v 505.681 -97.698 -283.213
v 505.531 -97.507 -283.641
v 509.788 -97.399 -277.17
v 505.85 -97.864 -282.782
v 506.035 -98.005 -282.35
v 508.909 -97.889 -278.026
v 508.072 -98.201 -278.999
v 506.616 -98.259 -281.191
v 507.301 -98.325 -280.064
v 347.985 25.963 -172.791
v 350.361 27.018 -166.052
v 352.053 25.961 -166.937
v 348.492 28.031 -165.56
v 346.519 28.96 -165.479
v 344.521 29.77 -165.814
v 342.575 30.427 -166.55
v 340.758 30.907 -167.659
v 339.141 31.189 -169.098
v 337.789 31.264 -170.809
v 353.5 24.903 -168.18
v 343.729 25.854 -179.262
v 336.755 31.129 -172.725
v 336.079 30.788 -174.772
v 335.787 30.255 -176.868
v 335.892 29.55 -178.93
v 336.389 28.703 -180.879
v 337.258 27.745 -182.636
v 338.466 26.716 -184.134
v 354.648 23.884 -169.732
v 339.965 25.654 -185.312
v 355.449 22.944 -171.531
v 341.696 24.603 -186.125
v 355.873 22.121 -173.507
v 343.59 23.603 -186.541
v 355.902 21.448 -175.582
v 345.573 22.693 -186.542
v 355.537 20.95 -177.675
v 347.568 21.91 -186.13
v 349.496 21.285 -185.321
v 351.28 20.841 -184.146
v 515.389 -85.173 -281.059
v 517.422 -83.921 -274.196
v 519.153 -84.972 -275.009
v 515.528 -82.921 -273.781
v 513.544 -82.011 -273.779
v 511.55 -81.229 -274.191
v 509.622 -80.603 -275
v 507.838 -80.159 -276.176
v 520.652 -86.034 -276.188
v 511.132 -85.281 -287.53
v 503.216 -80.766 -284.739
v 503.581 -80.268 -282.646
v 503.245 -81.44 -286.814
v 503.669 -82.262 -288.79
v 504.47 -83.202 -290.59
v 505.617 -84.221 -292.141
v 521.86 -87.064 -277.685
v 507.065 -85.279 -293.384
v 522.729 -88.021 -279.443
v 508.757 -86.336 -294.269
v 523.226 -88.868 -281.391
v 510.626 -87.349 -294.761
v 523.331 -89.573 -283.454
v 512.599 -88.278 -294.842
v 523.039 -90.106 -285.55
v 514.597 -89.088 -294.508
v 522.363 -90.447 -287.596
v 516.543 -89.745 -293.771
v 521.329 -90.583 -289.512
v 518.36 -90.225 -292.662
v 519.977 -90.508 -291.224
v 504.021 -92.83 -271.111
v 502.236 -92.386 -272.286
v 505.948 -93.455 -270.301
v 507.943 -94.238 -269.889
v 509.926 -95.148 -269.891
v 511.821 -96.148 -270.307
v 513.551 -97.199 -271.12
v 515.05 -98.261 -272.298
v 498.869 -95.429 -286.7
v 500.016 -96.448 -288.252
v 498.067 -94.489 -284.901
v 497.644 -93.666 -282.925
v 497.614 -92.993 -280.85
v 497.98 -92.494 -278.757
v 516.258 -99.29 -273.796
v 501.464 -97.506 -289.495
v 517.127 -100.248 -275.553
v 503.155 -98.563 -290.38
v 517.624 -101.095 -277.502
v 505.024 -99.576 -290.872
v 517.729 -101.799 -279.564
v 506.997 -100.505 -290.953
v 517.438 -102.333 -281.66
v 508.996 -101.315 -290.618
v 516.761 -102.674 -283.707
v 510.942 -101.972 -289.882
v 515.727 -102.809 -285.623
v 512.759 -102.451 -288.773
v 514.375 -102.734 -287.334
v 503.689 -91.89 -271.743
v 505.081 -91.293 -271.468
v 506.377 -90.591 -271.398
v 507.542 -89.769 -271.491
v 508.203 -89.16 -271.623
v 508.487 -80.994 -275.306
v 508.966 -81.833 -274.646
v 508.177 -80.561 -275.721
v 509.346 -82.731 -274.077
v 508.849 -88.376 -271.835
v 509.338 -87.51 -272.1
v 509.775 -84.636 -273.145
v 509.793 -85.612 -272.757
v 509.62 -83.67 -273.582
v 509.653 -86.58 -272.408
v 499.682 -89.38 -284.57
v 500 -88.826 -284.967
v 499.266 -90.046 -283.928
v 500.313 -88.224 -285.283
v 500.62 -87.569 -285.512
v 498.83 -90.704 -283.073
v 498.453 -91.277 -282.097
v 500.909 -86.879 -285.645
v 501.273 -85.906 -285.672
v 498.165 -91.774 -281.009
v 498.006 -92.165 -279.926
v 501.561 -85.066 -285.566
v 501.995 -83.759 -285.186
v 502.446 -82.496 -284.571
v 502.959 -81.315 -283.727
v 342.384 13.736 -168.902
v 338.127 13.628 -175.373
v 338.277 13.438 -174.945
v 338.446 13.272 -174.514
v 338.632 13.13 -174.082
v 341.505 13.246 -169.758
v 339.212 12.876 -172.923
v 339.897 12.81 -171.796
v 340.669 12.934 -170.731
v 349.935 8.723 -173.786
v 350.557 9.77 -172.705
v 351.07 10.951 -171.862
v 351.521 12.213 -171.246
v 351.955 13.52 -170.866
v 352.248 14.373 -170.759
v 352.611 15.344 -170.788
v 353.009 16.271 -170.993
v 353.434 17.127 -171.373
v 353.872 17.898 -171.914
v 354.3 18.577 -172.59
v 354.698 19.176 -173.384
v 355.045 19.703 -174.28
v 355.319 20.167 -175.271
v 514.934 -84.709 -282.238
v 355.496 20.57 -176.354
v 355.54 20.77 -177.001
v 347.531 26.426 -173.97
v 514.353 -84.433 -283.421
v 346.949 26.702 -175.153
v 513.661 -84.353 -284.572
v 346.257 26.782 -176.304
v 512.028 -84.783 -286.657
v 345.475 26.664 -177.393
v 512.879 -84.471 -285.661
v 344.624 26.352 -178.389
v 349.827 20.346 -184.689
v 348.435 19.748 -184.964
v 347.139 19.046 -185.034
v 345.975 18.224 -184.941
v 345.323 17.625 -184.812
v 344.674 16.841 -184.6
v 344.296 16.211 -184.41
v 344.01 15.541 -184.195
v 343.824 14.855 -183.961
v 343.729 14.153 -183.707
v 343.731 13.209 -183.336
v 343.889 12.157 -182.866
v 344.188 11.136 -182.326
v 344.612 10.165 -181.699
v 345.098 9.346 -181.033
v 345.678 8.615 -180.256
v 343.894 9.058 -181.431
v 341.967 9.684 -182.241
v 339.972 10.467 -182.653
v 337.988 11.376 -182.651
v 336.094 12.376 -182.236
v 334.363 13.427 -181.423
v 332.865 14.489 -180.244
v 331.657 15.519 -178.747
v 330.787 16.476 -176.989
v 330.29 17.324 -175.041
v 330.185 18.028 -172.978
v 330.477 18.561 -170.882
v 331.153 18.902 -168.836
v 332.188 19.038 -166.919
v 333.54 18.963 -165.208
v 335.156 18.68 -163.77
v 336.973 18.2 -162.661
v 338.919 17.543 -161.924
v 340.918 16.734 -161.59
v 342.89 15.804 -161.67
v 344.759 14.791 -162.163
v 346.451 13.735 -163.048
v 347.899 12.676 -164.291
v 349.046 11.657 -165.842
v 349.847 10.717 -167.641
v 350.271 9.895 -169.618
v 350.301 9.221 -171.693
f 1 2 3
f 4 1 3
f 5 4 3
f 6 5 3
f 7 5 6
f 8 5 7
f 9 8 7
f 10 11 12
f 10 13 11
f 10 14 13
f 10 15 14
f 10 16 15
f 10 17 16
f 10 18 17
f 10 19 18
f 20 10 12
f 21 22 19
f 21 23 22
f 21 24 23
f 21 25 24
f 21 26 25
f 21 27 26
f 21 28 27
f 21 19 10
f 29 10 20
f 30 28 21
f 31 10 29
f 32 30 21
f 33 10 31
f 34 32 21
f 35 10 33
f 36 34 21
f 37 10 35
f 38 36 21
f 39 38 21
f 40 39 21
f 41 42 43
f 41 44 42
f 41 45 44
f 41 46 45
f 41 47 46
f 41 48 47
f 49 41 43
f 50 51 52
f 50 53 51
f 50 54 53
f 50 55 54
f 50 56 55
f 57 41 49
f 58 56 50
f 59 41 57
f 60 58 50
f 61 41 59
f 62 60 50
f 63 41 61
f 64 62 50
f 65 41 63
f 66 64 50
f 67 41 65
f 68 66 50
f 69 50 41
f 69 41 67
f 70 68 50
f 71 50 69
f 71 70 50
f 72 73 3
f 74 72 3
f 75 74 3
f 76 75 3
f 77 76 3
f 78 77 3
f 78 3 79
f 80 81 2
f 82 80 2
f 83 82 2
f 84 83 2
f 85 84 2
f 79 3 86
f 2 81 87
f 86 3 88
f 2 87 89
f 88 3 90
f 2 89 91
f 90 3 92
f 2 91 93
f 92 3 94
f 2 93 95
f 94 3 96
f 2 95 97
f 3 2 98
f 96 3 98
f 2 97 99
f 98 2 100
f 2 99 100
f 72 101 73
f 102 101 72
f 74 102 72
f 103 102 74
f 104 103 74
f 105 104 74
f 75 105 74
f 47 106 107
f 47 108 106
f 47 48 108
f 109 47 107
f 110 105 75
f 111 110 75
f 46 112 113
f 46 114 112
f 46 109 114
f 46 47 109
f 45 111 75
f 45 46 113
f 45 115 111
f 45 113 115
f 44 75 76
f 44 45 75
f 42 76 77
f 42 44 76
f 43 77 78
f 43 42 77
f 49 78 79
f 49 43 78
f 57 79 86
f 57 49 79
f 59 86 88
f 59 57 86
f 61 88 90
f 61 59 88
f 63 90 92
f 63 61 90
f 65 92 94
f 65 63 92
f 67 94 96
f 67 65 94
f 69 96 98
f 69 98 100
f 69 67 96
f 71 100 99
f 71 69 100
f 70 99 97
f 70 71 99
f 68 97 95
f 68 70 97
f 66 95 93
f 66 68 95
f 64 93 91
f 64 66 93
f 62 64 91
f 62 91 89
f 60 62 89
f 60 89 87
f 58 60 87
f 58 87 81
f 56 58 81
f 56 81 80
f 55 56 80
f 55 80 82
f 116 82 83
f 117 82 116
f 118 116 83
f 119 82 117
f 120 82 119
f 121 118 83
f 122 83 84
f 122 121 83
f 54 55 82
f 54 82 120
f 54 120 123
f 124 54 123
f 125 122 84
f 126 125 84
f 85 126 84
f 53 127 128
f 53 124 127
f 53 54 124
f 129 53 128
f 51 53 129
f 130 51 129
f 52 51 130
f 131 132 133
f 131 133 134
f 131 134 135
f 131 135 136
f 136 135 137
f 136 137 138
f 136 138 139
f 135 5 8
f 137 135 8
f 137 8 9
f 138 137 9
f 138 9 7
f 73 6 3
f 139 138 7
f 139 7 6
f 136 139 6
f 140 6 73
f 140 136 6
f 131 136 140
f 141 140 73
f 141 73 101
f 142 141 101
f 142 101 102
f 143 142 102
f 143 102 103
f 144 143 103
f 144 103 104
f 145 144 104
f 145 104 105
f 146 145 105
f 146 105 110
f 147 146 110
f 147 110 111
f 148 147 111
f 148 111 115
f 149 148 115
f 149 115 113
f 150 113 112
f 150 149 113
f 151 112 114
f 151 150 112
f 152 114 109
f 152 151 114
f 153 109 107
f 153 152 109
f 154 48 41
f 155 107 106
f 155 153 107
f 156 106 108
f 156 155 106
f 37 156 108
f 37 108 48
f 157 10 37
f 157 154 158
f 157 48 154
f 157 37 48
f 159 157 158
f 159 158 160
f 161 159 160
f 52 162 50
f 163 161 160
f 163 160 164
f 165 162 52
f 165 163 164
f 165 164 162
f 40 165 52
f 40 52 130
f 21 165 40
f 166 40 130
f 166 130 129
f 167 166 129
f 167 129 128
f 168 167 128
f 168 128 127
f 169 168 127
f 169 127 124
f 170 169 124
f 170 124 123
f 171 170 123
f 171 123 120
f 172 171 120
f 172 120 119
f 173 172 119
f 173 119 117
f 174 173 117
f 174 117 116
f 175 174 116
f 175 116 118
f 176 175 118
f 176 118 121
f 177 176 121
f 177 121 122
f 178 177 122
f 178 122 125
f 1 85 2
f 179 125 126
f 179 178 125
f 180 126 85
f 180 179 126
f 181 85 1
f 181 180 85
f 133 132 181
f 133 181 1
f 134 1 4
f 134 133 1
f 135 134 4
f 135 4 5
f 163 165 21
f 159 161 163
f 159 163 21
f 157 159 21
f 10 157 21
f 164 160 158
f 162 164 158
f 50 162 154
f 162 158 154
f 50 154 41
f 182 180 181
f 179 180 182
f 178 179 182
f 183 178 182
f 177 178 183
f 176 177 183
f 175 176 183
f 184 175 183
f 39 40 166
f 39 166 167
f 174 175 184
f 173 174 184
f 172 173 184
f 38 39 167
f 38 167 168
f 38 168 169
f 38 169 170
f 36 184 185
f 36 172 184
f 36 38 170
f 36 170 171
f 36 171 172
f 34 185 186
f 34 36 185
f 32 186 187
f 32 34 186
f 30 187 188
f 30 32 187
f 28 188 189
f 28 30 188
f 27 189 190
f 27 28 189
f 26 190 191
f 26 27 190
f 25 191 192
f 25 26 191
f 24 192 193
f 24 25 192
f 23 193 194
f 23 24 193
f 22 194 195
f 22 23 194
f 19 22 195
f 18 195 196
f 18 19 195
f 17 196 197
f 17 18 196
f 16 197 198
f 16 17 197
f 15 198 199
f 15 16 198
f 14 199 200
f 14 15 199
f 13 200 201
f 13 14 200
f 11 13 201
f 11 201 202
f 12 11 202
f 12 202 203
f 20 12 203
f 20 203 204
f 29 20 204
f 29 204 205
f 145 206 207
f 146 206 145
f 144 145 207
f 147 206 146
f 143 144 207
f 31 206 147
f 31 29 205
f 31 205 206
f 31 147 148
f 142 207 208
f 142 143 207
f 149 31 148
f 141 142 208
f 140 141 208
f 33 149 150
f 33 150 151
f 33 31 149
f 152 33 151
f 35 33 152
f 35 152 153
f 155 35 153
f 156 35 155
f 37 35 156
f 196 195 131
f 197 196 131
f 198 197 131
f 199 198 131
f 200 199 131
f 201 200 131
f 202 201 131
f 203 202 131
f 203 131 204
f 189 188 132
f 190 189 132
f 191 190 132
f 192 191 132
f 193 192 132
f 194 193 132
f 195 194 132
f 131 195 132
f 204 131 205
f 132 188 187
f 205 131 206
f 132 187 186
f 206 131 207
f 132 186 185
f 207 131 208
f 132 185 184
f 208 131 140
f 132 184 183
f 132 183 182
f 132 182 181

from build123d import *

# Parameters (mm, degrees)
SUSP_FR_PULLROD_PROFILE_R                = 8
SUSP_FR_PULLROD_ROD_END_MOUNT_PROFILE_R  = 11
SUSP_FR_PULLROD_ROD_END_ROCKER_PROFILE_R = 11


with BuildPart() as part:
    # SUSP_FR_pullrod: sweep along a curve in space
    with BuildLine() as susp_fr_pullrod_path:
        Line((510.46, -91.34, -282.35), (343.0563, 19.7951, -174.0819))
    # SUSP_FR_pullrod profile (on start of the path) → SUSP_FR_pullrod (sweep)
    with BuildSketch(Plane(origin=(510.46, -91.34, -282.35), x_dir=(-0.5530888804852541, -0.8331222541041432, 0), z_dir=(-0.73343010732889, 0.48690577520692124, 0.47434485739141324))):
        Circle(SUSP_FR_PULLROD_PROFILE_R)
    sweep(path=susp_fr_pullrod_path.line)

    # SUSP_FR_pullrod_rod_end_mount: sweep along a curve in space
    with BuildLine() as susp_fr_pullrod_rod_end_mount_path:
        Line((507.659168, -97.4533881, -280.405308), (513.260832, -85.2266119, -284.294692))
    # SUSP_FR_pullrod_rod_end_mount profile (on start of the path) → SUSP_FR_pullrod_rod_end_mount (sweep)
    with BuildSketch(Plane(origin=(507.659168, -97.4533881, -280.405308), x_dir=(0.9091288863966713, -0.4165149071991883, 0), z_dir=(0.4001188533527077, 0.8733411488700952, -0.27781314022554215))):
        Circle(SUSP_FR_PULLROD_ROD_END_MOUNT_PROFILE_R)
    sweep(path=susp_fr_pullrod_rod_end_mount_path.line)

    # SUSP_FR_pullrod_rod_end_rocker: sweep along a curve in space
    with BuildLine() as susp_fr_pullrod_rod_end_rocker_path:
        Line((340.255468, 13.6817119, -172.137208), (345.857132, 25.9084881, -176.026592))
    # SUSP_FR_pullrod_rod_end_rocker profile (on start of the path) → SUSP_FR_pullrod_rod_end_rocker (sweep)
    with BuildSketch(Plane(origin=(340.255468, 13.6817119, -172.137208), x_dir=(0.9091288863966681, -0.41651490719919537, 0), z_dir=(0.40011885335271413, 0.8733411488700913, -0.2778131402255451))):
        Circle(SUSP_FR_PULLROD_ROD_END_ROCKER_PROFILE_R)
    sweep(path=susp_fr_pullrod_rod_end_rocker_path.line)


solid = part.part
